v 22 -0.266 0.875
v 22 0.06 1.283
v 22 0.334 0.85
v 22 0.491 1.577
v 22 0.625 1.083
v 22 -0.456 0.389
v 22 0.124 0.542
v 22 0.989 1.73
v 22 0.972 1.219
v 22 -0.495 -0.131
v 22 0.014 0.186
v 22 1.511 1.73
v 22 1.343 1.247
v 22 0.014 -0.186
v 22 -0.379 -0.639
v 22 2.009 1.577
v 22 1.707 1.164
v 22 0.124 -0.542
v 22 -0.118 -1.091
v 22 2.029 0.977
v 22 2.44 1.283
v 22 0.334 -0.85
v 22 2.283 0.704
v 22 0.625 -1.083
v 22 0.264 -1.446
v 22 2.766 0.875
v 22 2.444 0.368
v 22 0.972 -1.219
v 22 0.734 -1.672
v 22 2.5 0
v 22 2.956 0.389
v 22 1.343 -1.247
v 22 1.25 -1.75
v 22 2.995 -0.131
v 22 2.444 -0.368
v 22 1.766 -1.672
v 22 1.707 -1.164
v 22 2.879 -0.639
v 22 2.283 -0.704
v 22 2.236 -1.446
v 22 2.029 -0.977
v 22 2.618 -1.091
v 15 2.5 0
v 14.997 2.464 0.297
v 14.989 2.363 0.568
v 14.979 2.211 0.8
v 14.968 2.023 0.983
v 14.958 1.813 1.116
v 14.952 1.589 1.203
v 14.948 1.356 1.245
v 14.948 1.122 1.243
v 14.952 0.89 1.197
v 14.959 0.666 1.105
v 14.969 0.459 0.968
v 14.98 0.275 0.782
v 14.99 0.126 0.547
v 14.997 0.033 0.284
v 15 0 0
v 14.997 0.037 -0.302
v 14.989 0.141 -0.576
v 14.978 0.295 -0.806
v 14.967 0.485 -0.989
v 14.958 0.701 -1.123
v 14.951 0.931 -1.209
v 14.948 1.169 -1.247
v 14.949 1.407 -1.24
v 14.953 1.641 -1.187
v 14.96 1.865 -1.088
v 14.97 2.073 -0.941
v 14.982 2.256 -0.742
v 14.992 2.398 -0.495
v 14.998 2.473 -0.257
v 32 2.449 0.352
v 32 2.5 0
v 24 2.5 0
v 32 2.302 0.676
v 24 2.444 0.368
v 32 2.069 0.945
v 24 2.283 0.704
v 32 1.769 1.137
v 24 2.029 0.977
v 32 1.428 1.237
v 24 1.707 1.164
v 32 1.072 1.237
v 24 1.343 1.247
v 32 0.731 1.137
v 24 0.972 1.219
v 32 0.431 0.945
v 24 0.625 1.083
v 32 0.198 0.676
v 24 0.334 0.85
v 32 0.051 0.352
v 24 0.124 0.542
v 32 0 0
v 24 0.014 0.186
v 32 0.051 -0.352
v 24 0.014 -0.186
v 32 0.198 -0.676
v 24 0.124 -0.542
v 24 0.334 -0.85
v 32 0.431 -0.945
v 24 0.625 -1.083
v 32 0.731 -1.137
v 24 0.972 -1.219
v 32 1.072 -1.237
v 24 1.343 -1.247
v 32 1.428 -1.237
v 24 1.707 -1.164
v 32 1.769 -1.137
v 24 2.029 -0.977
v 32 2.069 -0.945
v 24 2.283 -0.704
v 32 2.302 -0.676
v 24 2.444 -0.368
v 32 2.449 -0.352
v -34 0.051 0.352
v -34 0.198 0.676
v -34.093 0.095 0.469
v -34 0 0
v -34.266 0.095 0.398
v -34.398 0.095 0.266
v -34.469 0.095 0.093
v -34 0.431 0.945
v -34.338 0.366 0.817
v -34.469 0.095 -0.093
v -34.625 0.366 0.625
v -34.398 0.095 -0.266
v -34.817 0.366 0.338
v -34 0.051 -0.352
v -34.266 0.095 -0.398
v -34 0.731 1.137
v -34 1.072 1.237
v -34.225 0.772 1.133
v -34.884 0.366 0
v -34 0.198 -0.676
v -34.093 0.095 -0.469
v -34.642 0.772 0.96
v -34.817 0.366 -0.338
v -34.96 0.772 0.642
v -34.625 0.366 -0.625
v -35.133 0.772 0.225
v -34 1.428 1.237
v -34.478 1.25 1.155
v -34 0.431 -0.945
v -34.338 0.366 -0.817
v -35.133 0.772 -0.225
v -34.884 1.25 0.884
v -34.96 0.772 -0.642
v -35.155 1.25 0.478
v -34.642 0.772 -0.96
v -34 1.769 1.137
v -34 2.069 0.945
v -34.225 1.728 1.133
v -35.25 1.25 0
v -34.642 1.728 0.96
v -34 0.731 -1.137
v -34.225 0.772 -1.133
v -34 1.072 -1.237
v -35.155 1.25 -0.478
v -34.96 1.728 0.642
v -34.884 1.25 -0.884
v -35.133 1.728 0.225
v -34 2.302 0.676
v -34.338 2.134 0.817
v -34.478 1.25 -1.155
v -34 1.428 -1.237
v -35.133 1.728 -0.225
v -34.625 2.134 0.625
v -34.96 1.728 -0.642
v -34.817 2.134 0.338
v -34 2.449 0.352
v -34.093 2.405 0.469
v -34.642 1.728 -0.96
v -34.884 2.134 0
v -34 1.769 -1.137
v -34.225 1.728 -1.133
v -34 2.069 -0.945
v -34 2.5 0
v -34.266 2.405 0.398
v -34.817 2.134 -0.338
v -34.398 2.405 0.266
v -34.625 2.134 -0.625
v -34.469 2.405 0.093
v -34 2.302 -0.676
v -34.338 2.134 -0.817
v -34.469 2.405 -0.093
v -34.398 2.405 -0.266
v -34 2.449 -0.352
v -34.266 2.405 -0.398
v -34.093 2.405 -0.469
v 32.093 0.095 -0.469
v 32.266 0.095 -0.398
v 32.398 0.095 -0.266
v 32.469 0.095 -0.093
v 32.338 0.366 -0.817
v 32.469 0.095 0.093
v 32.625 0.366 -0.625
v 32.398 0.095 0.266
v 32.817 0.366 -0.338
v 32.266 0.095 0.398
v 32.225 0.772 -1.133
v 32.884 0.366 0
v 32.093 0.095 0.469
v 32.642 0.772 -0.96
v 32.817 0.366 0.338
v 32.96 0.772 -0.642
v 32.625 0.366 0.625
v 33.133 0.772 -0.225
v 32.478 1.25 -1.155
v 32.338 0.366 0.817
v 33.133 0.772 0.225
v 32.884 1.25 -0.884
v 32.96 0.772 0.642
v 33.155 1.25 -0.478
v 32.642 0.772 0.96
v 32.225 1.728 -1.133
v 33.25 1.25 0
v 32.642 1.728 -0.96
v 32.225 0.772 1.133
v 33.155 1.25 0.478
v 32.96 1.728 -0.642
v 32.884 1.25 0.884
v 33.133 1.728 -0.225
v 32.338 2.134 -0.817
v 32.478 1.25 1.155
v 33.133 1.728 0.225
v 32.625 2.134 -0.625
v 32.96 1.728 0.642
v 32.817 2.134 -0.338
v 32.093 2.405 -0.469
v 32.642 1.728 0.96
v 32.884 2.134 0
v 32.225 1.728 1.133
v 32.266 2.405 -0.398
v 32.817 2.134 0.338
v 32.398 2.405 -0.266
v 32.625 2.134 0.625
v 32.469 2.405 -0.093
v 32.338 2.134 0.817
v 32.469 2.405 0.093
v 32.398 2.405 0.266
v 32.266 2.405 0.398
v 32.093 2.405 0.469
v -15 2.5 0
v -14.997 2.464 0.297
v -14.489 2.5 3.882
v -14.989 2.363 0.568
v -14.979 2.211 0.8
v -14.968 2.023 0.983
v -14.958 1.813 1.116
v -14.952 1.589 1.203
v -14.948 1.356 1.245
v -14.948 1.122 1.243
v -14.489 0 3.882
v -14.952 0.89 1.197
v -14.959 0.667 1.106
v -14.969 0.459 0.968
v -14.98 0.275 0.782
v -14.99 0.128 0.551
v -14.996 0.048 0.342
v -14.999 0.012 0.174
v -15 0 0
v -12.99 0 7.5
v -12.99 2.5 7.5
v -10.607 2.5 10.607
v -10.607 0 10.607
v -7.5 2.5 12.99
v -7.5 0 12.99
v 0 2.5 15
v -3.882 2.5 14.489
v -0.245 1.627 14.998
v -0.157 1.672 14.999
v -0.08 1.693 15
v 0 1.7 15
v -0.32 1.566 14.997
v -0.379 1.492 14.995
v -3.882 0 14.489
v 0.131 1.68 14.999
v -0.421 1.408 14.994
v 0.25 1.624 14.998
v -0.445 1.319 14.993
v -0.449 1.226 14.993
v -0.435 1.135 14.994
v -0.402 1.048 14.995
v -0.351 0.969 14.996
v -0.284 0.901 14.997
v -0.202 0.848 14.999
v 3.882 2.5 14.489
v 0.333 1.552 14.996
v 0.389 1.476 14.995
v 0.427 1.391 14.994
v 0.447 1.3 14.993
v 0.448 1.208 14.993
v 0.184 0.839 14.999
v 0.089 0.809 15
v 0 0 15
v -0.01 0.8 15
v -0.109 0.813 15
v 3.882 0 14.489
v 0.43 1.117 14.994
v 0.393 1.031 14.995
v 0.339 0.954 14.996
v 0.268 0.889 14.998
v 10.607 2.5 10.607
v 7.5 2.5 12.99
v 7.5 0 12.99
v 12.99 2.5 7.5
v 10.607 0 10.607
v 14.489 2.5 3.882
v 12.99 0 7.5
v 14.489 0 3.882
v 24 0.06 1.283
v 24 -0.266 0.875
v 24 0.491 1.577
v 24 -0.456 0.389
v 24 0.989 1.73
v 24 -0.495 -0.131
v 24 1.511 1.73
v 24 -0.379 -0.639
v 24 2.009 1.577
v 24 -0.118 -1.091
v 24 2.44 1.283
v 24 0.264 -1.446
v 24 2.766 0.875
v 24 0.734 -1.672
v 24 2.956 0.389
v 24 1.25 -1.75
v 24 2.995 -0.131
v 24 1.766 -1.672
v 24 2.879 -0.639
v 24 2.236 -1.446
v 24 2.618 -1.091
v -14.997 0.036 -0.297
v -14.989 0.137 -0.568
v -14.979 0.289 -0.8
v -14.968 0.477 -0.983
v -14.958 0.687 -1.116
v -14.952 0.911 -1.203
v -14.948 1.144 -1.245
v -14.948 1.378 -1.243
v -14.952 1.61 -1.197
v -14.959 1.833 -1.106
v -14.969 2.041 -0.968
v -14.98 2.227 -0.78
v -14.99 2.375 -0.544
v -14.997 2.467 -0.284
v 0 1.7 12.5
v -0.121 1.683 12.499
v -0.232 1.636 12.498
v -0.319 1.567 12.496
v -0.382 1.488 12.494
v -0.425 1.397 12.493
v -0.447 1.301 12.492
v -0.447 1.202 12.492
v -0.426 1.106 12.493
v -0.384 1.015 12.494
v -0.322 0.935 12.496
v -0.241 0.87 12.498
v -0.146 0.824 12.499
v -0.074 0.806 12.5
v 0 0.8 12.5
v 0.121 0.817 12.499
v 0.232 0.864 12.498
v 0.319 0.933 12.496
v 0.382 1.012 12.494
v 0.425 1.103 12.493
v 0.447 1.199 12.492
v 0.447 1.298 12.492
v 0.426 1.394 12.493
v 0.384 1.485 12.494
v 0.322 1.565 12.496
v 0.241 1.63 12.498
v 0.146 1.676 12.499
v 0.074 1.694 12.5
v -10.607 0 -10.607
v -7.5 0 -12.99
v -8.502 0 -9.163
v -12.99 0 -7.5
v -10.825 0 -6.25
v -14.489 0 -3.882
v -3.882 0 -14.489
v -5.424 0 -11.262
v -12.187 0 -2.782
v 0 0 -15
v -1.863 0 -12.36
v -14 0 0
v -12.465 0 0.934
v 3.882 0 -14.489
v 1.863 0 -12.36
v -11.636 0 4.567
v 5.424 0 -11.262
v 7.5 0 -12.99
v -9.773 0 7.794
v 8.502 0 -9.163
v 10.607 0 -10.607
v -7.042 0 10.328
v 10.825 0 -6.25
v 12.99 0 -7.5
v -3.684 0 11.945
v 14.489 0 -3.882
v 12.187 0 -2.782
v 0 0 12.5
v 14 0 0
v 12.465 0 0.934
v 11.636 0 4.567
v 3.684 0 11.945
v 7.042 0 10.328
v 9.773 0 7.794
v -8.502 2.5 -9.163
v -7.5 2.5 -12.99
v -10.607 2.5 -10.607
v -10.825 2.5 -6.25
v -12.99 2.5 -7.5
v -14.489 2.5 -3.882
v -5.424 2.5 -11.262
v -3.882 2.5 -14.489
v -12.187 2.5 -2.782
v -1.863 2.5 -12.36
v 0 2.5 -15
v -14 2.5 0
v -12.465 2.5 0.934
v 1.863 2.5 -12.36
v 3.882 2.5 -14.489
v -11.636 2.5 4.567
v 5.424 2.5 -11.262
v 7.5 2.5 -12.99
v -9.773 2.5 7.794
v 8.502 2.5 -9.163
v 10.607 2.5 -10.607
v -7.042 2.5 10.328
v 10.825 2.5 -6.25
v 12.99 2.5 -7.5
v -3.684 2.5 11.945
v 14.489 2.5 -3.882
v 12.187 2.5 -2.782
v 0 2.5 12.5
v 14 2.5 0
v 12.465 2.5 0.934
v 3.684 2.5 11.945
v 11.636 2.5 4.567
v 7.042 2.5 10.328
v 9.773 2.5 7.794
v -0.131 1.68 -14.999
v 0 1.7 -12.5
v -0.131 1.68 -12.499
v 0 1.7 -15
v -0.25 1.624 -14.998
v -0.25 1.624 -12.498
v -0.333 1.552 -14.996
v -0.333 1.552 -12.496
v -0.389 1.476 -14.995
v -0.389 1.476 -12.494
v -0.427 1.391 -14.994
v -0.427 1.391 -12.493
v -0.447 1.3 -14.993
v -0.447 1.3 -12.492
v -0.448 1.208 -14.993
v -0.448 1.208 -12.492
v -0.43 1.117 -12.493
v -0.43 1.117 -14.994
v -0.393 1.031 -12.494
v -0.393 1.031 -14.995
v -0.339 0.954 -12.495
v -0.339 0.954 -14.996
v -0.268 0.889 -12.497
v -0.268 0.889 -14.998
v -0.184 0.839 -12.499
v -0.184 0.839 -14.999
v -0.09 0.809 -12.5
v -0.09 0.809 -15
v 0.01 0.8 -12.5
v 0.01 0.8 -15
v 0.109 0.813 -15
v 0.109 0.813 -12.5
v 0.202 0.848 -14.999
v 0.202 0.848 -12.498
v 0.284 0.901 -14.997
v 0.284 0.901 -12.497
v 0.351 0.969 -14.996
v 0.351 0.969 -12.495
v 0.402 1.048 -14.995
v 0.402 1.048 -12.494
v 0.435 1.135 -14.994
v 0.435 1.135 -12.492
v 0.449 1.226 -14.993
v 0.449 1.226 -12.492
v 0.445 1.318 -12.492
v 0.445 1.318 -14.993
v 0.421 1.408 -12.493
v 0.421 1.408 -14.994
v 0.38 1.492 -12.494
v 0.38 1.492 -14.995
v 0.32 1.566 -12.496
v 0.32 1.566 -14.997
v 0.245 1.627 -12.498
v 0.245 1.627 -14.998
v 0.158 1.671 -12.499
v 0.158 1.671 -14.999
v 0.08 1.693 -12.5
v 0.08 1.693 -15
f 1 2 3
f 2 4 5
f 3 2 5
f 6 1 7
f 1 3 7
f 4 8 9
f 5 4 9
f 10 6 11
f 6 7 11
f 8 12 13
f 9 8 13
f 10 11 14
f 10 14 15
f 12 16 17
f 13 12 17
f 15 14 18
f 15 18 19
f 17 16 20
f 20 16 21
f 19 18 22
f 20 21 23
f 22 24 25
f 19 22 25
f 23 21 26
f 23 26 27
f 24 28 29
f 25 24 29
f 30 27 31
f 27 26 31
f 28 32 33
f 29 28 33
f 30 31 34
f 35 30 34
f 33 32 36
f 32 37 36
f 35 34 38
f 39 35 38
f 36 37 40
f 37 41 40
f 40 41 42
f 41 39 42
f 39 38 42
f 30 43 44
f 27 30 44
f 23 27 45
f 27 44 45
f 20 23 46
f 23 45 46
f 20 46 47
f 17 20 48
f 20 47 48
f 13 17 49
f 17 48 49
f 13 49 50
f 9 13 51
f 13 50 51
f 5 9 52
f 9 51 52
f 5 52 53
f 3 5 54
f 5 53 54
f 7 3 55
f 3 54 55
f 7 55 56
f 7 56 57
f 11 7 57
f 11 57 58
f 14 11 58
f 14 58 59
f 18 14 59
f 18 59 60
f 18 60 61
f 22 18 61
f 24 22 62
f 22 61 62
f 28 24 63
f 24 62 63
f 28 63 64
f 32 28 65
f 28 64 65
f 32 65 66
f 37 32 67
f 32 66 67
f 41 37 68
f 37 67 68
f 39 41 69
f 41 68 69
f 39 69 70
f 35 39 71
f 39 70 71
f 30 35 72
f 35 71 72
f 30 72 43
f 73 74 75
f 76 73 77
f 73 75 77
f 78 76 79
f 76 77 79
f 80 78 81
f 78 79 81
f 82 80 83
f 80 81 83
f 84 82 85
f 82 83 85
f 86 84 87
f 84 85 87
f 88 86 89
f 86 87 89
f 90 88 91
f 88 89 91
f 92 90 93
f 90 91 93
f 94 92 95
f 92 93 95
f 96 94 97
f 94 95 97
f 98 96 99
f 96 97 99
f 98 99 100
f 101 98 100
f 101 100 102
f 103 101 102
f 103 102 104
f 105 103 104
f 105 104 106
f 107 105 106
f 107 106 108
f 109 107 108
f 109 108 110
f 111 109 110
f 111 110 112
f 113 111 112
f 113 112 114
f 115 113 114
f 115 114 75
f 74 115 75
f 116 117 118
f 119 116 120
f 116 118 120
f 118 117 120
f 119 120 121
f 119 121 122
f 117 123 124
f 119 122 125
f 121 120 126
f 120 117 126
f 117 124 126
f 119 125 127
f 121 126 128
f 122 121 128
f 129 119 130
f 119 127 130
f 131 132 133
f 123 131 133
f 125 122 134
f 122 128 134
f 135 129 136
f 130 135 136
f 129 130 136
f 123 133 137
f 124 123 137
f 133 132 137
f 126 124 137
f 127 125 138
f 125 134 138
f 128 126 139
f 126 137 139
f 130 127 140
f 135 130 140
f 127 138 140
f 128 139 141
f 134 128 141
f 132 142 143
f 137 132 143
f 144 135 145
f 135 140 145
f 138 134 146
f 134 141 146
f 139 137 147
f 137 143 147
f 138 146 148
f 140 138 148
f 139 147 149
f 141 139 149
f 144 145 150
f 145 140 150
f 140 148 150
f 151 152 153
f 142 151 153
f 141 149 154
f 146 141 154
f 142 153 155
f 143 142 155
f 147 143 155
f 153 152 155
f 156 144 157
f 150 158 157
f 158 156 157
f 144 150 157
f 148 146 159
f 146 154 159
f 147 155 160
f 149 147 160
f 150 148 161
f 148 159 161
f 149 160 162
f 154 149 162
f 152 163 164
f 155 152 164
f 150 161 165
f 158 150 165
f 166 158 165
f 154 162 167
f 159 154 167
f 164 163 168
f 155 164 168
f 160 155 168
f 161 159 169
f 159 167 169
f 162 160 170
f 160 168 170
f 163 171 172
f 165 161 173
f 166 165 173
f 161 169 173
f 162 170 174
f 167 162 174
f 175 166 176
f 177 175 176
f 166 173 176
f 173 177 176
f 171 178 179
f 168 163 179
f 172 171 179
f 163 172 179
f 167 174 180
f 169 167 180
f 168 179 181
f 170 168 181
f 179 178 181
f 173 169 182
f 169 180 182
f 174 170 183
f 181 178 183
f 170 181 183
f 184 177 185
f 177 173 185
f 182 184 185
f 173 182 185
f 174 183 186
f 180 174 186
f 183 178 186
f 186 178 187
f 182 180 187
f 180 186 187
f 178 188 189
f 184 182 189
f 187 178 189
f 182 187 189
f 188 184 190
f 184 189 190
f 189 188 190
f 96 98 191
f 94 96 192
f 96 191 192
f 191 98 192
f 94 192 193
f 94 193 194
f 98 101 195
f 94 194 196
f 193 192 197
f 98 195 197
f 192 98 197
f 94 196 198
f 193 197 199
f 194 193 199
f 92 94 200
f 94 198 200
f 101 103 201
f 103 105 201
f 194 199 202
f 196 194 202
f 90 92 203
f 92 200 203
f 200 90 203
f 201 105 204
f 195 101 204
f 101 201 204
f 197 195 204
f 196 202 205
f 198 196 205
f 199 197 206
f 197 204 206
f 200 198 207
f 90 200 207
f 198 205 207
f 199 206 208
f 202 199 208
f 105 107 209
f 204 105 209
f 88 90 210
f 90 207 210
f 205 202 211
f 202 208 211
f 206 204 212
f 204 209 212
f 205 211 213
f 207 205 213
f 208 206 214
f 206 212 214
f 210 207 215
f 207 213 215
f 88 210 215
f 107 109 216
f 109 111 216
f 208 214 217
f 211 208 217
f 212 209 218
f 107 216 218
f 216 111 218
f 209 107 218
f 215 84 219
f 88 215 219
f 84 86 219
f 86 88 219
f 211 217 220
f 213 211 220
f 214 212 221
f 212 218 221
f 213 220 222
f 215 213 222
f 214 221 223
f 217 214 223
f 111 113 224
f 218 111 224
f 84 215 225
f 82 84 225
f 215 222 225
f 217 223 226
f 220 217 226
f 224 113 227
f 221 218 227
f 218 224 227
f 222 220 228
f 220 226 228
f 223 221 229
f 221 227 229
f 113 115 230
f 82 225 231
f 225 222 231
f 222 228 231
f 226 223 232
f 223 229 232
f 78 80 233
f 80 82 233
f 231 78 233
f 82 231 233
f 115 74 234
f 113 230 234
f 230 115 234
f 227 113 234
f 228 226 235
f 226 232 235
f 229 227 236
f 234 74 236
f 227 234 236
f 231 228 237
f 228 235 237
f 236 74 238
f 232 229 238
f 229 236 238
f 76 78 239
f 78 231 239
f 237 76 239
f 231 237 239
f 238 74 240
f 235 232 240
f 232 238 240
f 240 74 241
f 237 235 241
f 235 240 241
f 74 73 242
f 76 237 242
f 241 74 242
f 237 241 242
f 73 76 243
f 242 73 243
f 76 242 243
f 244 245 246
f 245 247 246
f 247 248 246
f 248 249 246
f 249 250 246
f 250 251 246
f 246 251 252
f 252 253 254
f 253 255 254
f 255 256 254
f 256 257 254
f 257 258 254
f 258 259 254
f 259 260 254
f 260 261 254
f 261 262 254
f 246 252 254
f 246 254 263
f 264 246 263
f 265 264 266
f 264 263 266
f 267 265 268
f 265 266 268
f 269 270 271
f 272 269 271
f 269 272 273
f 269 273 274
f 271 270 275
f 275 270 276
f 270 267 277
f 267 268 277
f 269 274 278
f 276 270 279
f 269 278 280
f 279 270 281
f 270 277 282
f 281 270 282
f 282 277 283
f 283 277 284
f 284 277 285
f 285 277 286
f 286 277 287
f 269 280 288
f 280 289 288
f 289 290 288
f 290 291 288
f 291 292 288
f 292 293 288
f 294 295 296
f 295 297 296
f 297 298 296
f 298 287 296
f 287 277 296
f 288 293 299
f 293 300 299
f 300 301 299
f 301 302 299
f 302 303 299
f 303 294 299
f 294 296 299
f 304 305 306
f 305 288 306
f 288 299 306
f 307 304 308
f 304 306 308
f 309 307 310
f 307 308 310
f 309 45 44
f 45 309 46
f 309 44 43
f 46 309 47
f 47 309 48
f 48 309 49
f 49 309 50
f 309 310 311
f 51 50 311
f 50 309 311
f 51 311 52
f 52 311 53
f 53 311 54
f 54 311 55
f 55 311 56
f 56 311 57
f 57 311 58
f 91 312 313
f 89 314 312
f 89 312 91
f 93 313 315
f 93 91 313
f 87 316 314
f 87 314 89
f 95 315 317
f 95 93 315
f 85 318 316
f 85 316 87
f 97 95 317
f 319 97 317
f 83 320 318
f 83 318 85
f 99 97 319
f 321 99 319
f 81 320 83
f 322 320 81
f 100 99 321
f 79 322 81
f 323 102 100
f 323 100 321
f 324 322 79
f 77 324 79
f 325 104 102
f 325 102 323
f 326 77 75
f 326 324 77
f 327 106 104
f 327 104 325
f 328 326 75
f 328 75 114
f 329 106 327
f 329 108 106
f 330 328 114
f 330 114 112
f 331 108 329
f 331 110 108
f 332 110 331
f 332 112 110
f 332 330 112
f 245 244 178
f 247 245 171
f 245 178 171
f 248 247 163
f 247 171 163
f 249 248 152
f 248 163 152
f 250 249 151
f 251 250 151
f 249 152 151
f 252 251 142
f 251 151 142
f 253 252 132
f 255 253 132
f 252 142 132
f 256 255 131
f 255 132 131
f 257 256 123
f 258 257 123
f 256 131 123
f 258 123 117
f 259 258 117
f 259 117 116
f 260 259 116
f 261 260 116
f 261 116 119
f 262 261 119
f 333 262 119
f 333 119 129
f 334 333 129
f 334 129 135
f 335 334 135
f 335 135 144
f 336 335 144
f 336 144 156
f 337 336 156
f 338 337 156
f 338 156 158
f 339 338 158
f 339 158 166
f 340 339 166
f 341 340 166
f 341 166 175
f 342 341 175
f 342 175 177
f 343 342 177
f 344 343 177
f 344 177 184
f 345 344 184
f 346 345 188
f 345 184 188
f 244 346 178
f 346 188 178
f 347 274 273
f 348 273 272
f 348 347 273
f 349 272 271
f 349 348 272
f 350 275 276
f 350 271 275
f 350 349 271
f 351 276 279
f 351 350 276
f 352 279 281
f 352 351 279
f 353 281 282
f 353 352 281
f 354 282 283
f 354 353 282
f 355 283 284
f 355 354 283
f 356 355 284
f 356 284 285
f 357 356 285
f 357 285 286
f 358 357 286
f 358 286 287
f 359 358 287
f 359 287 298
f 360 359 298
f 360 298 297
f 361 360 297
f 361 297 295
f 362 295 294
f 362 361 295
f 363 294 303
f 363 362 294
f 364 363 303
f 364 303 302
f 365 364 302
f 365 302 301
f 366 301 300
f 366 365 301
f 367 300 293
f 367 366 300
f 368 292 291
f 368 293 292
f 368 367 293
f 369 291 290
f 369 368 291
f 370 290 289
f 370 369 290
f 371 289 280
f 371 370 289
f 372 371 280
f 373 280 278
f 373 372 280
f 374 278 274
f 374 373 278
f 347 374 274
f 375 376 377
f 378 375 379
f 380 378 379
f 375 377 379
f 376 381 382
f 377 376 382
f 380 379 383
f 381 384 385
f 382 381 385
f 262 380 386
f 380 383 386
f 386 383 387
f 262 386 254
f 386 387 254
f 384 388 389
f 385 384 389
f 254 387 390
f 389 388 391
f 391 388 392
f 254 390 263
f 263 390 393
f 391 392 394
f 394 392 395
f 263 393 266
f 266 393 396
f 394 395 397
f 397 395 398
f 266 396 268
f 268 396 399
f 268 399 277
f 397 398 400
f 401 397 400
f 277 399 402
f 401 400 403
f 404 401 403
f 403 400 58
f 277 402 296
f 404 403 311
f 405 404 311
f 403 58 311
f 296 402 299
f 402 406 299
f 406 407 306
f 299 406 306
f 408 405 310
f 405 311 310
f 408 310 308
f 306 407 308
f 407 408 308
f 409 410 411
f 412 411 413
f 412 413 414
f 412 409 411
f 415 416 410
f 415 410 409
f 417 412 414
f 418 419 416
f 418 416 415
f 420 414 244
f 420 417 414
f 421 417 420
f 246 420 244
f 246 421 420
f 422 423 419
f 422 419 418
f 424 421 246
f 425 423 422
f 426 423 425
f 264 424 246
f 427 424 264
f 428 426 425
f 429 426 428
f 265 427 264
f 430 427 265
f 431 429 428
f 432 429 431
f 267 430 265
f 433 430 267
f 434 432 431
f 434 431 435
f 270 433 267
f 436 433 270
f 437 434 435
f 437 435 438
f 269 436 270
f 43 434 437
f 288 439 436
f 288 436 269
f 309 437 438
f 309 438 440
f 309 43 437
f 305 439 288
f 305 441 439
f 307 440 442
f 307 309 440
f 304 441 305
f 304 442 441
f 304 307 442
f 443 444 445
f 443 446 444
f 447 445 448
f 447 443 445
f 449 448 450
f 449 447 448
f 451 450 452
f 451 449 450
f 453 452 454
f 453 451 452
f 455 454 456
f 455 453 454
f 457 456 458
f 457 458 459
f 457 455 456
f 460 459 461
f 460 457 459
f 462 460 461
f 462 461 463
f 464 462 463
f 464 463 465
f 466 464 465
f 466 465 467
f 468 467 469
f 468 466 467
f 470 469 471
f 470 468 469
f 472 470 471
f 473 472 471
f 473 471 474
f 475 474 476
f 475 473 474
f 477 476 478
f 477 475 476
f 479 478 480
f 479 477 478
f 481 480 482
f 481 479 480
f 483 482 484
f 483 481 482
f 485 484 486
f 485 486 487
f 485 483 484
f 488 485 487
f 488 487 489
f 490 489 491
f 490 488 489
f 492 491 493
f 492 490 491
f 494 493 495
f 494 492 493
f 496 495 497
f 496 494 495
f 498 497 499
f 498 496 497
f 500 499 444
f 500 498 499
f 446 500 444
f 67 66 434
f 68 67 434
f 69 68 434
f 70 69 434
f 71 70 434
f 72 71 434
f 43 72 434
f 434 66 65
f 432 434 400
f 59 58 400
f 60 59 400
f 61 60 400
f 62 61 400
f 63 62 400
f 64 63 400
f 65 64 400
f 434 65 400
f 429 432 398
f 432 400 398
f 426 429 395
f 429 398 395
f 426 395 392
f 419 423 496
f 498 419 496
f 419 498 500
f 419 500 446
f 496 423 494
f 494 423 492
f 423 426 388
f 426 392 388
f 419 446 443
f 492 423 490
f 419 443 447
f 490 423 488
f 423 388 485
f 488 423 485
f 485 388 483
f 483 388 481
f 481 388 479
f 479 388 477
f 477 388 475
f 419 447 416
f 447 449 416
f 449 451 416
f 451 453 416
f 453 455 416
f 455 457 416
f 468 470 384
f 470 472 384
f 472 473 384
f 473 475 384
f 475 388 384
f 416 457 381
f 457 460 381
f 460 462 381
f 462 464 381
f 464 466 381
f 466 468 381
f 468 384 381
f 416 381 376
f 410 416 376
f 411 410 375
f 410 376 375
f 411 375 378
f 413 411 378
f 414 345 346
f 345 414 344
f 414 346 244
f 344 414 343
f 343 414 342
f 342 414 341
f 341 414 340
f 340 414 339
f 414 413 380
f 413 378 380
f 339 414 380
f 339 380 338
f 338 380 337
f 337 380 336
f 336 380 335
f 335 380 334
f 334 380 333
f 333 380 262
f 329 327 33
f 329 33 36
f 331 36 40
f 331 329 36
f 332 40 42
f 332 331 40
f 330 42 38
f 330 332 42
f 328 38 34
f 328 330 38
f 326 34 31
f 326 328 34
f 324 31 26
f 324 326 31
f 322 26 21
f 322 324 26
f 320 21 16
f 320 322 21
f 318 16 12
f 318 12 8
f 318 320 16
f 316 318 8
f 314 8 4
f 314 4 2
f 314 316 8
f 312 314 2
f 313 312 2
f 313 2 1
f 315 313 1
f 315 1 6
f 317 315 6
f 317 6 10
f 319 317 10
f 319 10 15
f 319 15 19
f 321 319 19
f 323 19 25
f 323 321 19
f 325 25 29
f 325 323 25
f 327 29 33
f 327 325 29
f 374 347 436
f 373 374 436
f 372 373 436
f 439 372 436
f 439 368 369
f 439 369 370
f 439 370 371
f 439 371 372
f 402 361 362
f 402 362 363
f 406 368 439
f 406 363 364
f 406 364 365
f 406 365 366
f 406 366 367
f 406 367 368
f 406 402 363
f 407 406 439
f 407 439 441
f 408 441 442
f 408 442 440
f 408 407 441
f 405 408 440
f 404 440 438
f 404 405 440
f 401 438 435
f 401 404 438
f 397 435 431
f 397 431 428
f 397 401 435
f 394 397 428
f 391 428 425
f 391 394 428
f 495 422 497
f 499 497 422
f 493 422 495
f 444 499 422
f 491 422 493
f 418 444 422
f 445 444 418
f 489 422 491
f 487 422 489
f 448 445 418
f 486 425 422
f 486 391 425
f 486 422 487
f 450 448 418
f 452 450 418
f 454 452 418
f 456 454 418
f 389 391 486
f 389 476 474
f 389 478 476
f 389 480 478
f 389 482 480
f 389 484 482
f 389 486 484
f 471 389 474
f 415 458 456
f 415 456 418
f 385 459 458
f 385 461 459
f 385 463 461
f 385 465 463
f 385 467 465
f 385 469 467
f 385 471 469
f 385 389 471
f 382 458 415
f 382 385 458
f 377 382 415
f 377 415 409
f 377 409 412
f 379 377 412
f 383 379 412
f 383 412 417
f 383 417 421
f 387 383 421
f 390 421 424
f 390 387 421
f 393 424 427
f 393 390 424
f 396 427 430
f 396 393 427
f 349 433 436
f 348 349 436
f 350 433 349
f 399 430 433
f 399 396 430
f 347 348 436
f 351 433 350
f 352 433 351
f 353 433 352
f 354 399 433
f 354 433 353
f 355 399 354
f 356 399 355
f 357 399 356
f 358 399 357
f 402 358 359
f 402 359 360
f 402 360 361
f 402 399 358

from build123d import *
from build123d.topology import SkipClean

# Parameters (mm, degrees)
SKETCH1_R               = 15
SKETCH1_R_2             = 12.5
BOSS_EXTRUDE2_DEPTH     = 2.5
CUT_EXTRUDE2_DEPTH      = 22.360009363
CUT_EXTRUDE2_DEPTH_BACK = 22.360009363
SKETCH3_R               = 0.45
SKETCH4_R               = 1.25
BOSS_EXTRUDE3_DEPTH     = 18
BOSS_EXTRUDE4_START     = -20
SKETCH6_R               = 1.25
BOSS_EXTRUDE4_DEPTH     = 20
SKETCH9_R               = 1.75
BOSS_EXTRUDE5_DEPTH     = 2


with BuildPart() as part:
    # Sketch1 → Boss-Extrude2 (new body)
    with BuildSketch(Plane(origin=(0, 0, 0), x_dir=(1, 0, 0), z_dir=(0, 1, 0))):
        with Locations(Location((0, 0, 0), (0, 0, 270))):
            Circle(SKETCH1_R)
        with Locations(Location((0, 0, 0), (0, 0, 270))):
            Circle(SKETCH1_R_2, mode=Mode.SUBTRACT)
    extrude(amount=BOSS_EXTRUDE2_DEPTH)

    # Sketch3 → Cut-Extrude2 (cut, two sides: drawn at the far end of the back side and taken through both)
    with BuildSketch(Plane.XY.offset(-CUT_EXTRUDE2_DEPTH_BACK)):
        with Locations(Location((0, 1.25, 0), (0, 0, 89.999999951))):
            Circle(SKETCH3_R)
    extrude(amount=CUT_EXTRUDE2_DEPTH + CUT_EXTRUDE2_DEPTH_BACK, mode=Mode.SUBTRACT)

    # Sketch4 → Boss-Extrude3 (add)
    with SkipClean():  # the faces are left unmerged after this step: merging them gives an invalid solid
        with BuildSketch(Plane(origin=(14, 0, 0), x_dir=(0, 0, -1), z_dir=(1, 0, 0))):
            with Locations(Location((0, 1.25, 0), (0, 0, 90))):
                Circle(SKETCH4_R)
        extrude(amount=BOSS_EXTRUDE3_DEPTH)

    # Sketch5 → Revolve1 (revolve)
    with SkipClean():  # the faces are left unmerged after this step: merging them gives an invalid solid
        with BuildSketch(Plane(origin=(32, 0, 0), x_dir=(0, 0, -1), z_dir=(1, 0, 0))):
            with BuildLine():
                Line((0, 2.5), (0, 0))
                ThreePointArc((0, 0), (1.25, 1.25), (0, 2.5))
            make_face()
        revolve(axis=Axis((32, 2.5, 0), (0, -1, 0)))

    # Sketch6 → Boss-Extrude4 (add)
    with BuildSketch(Plane(origin=(-14, 0, 0), x_dir=(0, 0, -1), z_dir=(1, 0, 0)).offset(BOSS_EXTRUDE4_START)):
        with Locations(Location((0, 1.25, 0), (0, 0, 90))):
            Circle(SKETCH6_R)
    extrude(amount=BOSS_EXTRUDE4_DEPTH)

    # Sketch7 → Revolve2 (revolve)
    with BuildSketch(Plane.ZY.offset(34)):
        with BuildLine():
            Line((0, 2.5), (0, 0))
            ThreePointArc((0, 0), (1.25, 1.25), (0, 2.5))
        make_face()
    revolve(axis=Axis((-34, 2.5, 0), (0, -1, 0)))

    # Sketch9 → Boss-Extrude5 (add)
    with BuildSketch(Plane(origin=(24, 0, 0), x_dir=(0, 0, -1), z_dir=(1, 0, 0))):
        with Locations((0, 1.25)):
            Circle(SKETCH9_R)
    extrude(amount=-BOSS_EXTRUDE5_DEPTH)


solid = part.part
